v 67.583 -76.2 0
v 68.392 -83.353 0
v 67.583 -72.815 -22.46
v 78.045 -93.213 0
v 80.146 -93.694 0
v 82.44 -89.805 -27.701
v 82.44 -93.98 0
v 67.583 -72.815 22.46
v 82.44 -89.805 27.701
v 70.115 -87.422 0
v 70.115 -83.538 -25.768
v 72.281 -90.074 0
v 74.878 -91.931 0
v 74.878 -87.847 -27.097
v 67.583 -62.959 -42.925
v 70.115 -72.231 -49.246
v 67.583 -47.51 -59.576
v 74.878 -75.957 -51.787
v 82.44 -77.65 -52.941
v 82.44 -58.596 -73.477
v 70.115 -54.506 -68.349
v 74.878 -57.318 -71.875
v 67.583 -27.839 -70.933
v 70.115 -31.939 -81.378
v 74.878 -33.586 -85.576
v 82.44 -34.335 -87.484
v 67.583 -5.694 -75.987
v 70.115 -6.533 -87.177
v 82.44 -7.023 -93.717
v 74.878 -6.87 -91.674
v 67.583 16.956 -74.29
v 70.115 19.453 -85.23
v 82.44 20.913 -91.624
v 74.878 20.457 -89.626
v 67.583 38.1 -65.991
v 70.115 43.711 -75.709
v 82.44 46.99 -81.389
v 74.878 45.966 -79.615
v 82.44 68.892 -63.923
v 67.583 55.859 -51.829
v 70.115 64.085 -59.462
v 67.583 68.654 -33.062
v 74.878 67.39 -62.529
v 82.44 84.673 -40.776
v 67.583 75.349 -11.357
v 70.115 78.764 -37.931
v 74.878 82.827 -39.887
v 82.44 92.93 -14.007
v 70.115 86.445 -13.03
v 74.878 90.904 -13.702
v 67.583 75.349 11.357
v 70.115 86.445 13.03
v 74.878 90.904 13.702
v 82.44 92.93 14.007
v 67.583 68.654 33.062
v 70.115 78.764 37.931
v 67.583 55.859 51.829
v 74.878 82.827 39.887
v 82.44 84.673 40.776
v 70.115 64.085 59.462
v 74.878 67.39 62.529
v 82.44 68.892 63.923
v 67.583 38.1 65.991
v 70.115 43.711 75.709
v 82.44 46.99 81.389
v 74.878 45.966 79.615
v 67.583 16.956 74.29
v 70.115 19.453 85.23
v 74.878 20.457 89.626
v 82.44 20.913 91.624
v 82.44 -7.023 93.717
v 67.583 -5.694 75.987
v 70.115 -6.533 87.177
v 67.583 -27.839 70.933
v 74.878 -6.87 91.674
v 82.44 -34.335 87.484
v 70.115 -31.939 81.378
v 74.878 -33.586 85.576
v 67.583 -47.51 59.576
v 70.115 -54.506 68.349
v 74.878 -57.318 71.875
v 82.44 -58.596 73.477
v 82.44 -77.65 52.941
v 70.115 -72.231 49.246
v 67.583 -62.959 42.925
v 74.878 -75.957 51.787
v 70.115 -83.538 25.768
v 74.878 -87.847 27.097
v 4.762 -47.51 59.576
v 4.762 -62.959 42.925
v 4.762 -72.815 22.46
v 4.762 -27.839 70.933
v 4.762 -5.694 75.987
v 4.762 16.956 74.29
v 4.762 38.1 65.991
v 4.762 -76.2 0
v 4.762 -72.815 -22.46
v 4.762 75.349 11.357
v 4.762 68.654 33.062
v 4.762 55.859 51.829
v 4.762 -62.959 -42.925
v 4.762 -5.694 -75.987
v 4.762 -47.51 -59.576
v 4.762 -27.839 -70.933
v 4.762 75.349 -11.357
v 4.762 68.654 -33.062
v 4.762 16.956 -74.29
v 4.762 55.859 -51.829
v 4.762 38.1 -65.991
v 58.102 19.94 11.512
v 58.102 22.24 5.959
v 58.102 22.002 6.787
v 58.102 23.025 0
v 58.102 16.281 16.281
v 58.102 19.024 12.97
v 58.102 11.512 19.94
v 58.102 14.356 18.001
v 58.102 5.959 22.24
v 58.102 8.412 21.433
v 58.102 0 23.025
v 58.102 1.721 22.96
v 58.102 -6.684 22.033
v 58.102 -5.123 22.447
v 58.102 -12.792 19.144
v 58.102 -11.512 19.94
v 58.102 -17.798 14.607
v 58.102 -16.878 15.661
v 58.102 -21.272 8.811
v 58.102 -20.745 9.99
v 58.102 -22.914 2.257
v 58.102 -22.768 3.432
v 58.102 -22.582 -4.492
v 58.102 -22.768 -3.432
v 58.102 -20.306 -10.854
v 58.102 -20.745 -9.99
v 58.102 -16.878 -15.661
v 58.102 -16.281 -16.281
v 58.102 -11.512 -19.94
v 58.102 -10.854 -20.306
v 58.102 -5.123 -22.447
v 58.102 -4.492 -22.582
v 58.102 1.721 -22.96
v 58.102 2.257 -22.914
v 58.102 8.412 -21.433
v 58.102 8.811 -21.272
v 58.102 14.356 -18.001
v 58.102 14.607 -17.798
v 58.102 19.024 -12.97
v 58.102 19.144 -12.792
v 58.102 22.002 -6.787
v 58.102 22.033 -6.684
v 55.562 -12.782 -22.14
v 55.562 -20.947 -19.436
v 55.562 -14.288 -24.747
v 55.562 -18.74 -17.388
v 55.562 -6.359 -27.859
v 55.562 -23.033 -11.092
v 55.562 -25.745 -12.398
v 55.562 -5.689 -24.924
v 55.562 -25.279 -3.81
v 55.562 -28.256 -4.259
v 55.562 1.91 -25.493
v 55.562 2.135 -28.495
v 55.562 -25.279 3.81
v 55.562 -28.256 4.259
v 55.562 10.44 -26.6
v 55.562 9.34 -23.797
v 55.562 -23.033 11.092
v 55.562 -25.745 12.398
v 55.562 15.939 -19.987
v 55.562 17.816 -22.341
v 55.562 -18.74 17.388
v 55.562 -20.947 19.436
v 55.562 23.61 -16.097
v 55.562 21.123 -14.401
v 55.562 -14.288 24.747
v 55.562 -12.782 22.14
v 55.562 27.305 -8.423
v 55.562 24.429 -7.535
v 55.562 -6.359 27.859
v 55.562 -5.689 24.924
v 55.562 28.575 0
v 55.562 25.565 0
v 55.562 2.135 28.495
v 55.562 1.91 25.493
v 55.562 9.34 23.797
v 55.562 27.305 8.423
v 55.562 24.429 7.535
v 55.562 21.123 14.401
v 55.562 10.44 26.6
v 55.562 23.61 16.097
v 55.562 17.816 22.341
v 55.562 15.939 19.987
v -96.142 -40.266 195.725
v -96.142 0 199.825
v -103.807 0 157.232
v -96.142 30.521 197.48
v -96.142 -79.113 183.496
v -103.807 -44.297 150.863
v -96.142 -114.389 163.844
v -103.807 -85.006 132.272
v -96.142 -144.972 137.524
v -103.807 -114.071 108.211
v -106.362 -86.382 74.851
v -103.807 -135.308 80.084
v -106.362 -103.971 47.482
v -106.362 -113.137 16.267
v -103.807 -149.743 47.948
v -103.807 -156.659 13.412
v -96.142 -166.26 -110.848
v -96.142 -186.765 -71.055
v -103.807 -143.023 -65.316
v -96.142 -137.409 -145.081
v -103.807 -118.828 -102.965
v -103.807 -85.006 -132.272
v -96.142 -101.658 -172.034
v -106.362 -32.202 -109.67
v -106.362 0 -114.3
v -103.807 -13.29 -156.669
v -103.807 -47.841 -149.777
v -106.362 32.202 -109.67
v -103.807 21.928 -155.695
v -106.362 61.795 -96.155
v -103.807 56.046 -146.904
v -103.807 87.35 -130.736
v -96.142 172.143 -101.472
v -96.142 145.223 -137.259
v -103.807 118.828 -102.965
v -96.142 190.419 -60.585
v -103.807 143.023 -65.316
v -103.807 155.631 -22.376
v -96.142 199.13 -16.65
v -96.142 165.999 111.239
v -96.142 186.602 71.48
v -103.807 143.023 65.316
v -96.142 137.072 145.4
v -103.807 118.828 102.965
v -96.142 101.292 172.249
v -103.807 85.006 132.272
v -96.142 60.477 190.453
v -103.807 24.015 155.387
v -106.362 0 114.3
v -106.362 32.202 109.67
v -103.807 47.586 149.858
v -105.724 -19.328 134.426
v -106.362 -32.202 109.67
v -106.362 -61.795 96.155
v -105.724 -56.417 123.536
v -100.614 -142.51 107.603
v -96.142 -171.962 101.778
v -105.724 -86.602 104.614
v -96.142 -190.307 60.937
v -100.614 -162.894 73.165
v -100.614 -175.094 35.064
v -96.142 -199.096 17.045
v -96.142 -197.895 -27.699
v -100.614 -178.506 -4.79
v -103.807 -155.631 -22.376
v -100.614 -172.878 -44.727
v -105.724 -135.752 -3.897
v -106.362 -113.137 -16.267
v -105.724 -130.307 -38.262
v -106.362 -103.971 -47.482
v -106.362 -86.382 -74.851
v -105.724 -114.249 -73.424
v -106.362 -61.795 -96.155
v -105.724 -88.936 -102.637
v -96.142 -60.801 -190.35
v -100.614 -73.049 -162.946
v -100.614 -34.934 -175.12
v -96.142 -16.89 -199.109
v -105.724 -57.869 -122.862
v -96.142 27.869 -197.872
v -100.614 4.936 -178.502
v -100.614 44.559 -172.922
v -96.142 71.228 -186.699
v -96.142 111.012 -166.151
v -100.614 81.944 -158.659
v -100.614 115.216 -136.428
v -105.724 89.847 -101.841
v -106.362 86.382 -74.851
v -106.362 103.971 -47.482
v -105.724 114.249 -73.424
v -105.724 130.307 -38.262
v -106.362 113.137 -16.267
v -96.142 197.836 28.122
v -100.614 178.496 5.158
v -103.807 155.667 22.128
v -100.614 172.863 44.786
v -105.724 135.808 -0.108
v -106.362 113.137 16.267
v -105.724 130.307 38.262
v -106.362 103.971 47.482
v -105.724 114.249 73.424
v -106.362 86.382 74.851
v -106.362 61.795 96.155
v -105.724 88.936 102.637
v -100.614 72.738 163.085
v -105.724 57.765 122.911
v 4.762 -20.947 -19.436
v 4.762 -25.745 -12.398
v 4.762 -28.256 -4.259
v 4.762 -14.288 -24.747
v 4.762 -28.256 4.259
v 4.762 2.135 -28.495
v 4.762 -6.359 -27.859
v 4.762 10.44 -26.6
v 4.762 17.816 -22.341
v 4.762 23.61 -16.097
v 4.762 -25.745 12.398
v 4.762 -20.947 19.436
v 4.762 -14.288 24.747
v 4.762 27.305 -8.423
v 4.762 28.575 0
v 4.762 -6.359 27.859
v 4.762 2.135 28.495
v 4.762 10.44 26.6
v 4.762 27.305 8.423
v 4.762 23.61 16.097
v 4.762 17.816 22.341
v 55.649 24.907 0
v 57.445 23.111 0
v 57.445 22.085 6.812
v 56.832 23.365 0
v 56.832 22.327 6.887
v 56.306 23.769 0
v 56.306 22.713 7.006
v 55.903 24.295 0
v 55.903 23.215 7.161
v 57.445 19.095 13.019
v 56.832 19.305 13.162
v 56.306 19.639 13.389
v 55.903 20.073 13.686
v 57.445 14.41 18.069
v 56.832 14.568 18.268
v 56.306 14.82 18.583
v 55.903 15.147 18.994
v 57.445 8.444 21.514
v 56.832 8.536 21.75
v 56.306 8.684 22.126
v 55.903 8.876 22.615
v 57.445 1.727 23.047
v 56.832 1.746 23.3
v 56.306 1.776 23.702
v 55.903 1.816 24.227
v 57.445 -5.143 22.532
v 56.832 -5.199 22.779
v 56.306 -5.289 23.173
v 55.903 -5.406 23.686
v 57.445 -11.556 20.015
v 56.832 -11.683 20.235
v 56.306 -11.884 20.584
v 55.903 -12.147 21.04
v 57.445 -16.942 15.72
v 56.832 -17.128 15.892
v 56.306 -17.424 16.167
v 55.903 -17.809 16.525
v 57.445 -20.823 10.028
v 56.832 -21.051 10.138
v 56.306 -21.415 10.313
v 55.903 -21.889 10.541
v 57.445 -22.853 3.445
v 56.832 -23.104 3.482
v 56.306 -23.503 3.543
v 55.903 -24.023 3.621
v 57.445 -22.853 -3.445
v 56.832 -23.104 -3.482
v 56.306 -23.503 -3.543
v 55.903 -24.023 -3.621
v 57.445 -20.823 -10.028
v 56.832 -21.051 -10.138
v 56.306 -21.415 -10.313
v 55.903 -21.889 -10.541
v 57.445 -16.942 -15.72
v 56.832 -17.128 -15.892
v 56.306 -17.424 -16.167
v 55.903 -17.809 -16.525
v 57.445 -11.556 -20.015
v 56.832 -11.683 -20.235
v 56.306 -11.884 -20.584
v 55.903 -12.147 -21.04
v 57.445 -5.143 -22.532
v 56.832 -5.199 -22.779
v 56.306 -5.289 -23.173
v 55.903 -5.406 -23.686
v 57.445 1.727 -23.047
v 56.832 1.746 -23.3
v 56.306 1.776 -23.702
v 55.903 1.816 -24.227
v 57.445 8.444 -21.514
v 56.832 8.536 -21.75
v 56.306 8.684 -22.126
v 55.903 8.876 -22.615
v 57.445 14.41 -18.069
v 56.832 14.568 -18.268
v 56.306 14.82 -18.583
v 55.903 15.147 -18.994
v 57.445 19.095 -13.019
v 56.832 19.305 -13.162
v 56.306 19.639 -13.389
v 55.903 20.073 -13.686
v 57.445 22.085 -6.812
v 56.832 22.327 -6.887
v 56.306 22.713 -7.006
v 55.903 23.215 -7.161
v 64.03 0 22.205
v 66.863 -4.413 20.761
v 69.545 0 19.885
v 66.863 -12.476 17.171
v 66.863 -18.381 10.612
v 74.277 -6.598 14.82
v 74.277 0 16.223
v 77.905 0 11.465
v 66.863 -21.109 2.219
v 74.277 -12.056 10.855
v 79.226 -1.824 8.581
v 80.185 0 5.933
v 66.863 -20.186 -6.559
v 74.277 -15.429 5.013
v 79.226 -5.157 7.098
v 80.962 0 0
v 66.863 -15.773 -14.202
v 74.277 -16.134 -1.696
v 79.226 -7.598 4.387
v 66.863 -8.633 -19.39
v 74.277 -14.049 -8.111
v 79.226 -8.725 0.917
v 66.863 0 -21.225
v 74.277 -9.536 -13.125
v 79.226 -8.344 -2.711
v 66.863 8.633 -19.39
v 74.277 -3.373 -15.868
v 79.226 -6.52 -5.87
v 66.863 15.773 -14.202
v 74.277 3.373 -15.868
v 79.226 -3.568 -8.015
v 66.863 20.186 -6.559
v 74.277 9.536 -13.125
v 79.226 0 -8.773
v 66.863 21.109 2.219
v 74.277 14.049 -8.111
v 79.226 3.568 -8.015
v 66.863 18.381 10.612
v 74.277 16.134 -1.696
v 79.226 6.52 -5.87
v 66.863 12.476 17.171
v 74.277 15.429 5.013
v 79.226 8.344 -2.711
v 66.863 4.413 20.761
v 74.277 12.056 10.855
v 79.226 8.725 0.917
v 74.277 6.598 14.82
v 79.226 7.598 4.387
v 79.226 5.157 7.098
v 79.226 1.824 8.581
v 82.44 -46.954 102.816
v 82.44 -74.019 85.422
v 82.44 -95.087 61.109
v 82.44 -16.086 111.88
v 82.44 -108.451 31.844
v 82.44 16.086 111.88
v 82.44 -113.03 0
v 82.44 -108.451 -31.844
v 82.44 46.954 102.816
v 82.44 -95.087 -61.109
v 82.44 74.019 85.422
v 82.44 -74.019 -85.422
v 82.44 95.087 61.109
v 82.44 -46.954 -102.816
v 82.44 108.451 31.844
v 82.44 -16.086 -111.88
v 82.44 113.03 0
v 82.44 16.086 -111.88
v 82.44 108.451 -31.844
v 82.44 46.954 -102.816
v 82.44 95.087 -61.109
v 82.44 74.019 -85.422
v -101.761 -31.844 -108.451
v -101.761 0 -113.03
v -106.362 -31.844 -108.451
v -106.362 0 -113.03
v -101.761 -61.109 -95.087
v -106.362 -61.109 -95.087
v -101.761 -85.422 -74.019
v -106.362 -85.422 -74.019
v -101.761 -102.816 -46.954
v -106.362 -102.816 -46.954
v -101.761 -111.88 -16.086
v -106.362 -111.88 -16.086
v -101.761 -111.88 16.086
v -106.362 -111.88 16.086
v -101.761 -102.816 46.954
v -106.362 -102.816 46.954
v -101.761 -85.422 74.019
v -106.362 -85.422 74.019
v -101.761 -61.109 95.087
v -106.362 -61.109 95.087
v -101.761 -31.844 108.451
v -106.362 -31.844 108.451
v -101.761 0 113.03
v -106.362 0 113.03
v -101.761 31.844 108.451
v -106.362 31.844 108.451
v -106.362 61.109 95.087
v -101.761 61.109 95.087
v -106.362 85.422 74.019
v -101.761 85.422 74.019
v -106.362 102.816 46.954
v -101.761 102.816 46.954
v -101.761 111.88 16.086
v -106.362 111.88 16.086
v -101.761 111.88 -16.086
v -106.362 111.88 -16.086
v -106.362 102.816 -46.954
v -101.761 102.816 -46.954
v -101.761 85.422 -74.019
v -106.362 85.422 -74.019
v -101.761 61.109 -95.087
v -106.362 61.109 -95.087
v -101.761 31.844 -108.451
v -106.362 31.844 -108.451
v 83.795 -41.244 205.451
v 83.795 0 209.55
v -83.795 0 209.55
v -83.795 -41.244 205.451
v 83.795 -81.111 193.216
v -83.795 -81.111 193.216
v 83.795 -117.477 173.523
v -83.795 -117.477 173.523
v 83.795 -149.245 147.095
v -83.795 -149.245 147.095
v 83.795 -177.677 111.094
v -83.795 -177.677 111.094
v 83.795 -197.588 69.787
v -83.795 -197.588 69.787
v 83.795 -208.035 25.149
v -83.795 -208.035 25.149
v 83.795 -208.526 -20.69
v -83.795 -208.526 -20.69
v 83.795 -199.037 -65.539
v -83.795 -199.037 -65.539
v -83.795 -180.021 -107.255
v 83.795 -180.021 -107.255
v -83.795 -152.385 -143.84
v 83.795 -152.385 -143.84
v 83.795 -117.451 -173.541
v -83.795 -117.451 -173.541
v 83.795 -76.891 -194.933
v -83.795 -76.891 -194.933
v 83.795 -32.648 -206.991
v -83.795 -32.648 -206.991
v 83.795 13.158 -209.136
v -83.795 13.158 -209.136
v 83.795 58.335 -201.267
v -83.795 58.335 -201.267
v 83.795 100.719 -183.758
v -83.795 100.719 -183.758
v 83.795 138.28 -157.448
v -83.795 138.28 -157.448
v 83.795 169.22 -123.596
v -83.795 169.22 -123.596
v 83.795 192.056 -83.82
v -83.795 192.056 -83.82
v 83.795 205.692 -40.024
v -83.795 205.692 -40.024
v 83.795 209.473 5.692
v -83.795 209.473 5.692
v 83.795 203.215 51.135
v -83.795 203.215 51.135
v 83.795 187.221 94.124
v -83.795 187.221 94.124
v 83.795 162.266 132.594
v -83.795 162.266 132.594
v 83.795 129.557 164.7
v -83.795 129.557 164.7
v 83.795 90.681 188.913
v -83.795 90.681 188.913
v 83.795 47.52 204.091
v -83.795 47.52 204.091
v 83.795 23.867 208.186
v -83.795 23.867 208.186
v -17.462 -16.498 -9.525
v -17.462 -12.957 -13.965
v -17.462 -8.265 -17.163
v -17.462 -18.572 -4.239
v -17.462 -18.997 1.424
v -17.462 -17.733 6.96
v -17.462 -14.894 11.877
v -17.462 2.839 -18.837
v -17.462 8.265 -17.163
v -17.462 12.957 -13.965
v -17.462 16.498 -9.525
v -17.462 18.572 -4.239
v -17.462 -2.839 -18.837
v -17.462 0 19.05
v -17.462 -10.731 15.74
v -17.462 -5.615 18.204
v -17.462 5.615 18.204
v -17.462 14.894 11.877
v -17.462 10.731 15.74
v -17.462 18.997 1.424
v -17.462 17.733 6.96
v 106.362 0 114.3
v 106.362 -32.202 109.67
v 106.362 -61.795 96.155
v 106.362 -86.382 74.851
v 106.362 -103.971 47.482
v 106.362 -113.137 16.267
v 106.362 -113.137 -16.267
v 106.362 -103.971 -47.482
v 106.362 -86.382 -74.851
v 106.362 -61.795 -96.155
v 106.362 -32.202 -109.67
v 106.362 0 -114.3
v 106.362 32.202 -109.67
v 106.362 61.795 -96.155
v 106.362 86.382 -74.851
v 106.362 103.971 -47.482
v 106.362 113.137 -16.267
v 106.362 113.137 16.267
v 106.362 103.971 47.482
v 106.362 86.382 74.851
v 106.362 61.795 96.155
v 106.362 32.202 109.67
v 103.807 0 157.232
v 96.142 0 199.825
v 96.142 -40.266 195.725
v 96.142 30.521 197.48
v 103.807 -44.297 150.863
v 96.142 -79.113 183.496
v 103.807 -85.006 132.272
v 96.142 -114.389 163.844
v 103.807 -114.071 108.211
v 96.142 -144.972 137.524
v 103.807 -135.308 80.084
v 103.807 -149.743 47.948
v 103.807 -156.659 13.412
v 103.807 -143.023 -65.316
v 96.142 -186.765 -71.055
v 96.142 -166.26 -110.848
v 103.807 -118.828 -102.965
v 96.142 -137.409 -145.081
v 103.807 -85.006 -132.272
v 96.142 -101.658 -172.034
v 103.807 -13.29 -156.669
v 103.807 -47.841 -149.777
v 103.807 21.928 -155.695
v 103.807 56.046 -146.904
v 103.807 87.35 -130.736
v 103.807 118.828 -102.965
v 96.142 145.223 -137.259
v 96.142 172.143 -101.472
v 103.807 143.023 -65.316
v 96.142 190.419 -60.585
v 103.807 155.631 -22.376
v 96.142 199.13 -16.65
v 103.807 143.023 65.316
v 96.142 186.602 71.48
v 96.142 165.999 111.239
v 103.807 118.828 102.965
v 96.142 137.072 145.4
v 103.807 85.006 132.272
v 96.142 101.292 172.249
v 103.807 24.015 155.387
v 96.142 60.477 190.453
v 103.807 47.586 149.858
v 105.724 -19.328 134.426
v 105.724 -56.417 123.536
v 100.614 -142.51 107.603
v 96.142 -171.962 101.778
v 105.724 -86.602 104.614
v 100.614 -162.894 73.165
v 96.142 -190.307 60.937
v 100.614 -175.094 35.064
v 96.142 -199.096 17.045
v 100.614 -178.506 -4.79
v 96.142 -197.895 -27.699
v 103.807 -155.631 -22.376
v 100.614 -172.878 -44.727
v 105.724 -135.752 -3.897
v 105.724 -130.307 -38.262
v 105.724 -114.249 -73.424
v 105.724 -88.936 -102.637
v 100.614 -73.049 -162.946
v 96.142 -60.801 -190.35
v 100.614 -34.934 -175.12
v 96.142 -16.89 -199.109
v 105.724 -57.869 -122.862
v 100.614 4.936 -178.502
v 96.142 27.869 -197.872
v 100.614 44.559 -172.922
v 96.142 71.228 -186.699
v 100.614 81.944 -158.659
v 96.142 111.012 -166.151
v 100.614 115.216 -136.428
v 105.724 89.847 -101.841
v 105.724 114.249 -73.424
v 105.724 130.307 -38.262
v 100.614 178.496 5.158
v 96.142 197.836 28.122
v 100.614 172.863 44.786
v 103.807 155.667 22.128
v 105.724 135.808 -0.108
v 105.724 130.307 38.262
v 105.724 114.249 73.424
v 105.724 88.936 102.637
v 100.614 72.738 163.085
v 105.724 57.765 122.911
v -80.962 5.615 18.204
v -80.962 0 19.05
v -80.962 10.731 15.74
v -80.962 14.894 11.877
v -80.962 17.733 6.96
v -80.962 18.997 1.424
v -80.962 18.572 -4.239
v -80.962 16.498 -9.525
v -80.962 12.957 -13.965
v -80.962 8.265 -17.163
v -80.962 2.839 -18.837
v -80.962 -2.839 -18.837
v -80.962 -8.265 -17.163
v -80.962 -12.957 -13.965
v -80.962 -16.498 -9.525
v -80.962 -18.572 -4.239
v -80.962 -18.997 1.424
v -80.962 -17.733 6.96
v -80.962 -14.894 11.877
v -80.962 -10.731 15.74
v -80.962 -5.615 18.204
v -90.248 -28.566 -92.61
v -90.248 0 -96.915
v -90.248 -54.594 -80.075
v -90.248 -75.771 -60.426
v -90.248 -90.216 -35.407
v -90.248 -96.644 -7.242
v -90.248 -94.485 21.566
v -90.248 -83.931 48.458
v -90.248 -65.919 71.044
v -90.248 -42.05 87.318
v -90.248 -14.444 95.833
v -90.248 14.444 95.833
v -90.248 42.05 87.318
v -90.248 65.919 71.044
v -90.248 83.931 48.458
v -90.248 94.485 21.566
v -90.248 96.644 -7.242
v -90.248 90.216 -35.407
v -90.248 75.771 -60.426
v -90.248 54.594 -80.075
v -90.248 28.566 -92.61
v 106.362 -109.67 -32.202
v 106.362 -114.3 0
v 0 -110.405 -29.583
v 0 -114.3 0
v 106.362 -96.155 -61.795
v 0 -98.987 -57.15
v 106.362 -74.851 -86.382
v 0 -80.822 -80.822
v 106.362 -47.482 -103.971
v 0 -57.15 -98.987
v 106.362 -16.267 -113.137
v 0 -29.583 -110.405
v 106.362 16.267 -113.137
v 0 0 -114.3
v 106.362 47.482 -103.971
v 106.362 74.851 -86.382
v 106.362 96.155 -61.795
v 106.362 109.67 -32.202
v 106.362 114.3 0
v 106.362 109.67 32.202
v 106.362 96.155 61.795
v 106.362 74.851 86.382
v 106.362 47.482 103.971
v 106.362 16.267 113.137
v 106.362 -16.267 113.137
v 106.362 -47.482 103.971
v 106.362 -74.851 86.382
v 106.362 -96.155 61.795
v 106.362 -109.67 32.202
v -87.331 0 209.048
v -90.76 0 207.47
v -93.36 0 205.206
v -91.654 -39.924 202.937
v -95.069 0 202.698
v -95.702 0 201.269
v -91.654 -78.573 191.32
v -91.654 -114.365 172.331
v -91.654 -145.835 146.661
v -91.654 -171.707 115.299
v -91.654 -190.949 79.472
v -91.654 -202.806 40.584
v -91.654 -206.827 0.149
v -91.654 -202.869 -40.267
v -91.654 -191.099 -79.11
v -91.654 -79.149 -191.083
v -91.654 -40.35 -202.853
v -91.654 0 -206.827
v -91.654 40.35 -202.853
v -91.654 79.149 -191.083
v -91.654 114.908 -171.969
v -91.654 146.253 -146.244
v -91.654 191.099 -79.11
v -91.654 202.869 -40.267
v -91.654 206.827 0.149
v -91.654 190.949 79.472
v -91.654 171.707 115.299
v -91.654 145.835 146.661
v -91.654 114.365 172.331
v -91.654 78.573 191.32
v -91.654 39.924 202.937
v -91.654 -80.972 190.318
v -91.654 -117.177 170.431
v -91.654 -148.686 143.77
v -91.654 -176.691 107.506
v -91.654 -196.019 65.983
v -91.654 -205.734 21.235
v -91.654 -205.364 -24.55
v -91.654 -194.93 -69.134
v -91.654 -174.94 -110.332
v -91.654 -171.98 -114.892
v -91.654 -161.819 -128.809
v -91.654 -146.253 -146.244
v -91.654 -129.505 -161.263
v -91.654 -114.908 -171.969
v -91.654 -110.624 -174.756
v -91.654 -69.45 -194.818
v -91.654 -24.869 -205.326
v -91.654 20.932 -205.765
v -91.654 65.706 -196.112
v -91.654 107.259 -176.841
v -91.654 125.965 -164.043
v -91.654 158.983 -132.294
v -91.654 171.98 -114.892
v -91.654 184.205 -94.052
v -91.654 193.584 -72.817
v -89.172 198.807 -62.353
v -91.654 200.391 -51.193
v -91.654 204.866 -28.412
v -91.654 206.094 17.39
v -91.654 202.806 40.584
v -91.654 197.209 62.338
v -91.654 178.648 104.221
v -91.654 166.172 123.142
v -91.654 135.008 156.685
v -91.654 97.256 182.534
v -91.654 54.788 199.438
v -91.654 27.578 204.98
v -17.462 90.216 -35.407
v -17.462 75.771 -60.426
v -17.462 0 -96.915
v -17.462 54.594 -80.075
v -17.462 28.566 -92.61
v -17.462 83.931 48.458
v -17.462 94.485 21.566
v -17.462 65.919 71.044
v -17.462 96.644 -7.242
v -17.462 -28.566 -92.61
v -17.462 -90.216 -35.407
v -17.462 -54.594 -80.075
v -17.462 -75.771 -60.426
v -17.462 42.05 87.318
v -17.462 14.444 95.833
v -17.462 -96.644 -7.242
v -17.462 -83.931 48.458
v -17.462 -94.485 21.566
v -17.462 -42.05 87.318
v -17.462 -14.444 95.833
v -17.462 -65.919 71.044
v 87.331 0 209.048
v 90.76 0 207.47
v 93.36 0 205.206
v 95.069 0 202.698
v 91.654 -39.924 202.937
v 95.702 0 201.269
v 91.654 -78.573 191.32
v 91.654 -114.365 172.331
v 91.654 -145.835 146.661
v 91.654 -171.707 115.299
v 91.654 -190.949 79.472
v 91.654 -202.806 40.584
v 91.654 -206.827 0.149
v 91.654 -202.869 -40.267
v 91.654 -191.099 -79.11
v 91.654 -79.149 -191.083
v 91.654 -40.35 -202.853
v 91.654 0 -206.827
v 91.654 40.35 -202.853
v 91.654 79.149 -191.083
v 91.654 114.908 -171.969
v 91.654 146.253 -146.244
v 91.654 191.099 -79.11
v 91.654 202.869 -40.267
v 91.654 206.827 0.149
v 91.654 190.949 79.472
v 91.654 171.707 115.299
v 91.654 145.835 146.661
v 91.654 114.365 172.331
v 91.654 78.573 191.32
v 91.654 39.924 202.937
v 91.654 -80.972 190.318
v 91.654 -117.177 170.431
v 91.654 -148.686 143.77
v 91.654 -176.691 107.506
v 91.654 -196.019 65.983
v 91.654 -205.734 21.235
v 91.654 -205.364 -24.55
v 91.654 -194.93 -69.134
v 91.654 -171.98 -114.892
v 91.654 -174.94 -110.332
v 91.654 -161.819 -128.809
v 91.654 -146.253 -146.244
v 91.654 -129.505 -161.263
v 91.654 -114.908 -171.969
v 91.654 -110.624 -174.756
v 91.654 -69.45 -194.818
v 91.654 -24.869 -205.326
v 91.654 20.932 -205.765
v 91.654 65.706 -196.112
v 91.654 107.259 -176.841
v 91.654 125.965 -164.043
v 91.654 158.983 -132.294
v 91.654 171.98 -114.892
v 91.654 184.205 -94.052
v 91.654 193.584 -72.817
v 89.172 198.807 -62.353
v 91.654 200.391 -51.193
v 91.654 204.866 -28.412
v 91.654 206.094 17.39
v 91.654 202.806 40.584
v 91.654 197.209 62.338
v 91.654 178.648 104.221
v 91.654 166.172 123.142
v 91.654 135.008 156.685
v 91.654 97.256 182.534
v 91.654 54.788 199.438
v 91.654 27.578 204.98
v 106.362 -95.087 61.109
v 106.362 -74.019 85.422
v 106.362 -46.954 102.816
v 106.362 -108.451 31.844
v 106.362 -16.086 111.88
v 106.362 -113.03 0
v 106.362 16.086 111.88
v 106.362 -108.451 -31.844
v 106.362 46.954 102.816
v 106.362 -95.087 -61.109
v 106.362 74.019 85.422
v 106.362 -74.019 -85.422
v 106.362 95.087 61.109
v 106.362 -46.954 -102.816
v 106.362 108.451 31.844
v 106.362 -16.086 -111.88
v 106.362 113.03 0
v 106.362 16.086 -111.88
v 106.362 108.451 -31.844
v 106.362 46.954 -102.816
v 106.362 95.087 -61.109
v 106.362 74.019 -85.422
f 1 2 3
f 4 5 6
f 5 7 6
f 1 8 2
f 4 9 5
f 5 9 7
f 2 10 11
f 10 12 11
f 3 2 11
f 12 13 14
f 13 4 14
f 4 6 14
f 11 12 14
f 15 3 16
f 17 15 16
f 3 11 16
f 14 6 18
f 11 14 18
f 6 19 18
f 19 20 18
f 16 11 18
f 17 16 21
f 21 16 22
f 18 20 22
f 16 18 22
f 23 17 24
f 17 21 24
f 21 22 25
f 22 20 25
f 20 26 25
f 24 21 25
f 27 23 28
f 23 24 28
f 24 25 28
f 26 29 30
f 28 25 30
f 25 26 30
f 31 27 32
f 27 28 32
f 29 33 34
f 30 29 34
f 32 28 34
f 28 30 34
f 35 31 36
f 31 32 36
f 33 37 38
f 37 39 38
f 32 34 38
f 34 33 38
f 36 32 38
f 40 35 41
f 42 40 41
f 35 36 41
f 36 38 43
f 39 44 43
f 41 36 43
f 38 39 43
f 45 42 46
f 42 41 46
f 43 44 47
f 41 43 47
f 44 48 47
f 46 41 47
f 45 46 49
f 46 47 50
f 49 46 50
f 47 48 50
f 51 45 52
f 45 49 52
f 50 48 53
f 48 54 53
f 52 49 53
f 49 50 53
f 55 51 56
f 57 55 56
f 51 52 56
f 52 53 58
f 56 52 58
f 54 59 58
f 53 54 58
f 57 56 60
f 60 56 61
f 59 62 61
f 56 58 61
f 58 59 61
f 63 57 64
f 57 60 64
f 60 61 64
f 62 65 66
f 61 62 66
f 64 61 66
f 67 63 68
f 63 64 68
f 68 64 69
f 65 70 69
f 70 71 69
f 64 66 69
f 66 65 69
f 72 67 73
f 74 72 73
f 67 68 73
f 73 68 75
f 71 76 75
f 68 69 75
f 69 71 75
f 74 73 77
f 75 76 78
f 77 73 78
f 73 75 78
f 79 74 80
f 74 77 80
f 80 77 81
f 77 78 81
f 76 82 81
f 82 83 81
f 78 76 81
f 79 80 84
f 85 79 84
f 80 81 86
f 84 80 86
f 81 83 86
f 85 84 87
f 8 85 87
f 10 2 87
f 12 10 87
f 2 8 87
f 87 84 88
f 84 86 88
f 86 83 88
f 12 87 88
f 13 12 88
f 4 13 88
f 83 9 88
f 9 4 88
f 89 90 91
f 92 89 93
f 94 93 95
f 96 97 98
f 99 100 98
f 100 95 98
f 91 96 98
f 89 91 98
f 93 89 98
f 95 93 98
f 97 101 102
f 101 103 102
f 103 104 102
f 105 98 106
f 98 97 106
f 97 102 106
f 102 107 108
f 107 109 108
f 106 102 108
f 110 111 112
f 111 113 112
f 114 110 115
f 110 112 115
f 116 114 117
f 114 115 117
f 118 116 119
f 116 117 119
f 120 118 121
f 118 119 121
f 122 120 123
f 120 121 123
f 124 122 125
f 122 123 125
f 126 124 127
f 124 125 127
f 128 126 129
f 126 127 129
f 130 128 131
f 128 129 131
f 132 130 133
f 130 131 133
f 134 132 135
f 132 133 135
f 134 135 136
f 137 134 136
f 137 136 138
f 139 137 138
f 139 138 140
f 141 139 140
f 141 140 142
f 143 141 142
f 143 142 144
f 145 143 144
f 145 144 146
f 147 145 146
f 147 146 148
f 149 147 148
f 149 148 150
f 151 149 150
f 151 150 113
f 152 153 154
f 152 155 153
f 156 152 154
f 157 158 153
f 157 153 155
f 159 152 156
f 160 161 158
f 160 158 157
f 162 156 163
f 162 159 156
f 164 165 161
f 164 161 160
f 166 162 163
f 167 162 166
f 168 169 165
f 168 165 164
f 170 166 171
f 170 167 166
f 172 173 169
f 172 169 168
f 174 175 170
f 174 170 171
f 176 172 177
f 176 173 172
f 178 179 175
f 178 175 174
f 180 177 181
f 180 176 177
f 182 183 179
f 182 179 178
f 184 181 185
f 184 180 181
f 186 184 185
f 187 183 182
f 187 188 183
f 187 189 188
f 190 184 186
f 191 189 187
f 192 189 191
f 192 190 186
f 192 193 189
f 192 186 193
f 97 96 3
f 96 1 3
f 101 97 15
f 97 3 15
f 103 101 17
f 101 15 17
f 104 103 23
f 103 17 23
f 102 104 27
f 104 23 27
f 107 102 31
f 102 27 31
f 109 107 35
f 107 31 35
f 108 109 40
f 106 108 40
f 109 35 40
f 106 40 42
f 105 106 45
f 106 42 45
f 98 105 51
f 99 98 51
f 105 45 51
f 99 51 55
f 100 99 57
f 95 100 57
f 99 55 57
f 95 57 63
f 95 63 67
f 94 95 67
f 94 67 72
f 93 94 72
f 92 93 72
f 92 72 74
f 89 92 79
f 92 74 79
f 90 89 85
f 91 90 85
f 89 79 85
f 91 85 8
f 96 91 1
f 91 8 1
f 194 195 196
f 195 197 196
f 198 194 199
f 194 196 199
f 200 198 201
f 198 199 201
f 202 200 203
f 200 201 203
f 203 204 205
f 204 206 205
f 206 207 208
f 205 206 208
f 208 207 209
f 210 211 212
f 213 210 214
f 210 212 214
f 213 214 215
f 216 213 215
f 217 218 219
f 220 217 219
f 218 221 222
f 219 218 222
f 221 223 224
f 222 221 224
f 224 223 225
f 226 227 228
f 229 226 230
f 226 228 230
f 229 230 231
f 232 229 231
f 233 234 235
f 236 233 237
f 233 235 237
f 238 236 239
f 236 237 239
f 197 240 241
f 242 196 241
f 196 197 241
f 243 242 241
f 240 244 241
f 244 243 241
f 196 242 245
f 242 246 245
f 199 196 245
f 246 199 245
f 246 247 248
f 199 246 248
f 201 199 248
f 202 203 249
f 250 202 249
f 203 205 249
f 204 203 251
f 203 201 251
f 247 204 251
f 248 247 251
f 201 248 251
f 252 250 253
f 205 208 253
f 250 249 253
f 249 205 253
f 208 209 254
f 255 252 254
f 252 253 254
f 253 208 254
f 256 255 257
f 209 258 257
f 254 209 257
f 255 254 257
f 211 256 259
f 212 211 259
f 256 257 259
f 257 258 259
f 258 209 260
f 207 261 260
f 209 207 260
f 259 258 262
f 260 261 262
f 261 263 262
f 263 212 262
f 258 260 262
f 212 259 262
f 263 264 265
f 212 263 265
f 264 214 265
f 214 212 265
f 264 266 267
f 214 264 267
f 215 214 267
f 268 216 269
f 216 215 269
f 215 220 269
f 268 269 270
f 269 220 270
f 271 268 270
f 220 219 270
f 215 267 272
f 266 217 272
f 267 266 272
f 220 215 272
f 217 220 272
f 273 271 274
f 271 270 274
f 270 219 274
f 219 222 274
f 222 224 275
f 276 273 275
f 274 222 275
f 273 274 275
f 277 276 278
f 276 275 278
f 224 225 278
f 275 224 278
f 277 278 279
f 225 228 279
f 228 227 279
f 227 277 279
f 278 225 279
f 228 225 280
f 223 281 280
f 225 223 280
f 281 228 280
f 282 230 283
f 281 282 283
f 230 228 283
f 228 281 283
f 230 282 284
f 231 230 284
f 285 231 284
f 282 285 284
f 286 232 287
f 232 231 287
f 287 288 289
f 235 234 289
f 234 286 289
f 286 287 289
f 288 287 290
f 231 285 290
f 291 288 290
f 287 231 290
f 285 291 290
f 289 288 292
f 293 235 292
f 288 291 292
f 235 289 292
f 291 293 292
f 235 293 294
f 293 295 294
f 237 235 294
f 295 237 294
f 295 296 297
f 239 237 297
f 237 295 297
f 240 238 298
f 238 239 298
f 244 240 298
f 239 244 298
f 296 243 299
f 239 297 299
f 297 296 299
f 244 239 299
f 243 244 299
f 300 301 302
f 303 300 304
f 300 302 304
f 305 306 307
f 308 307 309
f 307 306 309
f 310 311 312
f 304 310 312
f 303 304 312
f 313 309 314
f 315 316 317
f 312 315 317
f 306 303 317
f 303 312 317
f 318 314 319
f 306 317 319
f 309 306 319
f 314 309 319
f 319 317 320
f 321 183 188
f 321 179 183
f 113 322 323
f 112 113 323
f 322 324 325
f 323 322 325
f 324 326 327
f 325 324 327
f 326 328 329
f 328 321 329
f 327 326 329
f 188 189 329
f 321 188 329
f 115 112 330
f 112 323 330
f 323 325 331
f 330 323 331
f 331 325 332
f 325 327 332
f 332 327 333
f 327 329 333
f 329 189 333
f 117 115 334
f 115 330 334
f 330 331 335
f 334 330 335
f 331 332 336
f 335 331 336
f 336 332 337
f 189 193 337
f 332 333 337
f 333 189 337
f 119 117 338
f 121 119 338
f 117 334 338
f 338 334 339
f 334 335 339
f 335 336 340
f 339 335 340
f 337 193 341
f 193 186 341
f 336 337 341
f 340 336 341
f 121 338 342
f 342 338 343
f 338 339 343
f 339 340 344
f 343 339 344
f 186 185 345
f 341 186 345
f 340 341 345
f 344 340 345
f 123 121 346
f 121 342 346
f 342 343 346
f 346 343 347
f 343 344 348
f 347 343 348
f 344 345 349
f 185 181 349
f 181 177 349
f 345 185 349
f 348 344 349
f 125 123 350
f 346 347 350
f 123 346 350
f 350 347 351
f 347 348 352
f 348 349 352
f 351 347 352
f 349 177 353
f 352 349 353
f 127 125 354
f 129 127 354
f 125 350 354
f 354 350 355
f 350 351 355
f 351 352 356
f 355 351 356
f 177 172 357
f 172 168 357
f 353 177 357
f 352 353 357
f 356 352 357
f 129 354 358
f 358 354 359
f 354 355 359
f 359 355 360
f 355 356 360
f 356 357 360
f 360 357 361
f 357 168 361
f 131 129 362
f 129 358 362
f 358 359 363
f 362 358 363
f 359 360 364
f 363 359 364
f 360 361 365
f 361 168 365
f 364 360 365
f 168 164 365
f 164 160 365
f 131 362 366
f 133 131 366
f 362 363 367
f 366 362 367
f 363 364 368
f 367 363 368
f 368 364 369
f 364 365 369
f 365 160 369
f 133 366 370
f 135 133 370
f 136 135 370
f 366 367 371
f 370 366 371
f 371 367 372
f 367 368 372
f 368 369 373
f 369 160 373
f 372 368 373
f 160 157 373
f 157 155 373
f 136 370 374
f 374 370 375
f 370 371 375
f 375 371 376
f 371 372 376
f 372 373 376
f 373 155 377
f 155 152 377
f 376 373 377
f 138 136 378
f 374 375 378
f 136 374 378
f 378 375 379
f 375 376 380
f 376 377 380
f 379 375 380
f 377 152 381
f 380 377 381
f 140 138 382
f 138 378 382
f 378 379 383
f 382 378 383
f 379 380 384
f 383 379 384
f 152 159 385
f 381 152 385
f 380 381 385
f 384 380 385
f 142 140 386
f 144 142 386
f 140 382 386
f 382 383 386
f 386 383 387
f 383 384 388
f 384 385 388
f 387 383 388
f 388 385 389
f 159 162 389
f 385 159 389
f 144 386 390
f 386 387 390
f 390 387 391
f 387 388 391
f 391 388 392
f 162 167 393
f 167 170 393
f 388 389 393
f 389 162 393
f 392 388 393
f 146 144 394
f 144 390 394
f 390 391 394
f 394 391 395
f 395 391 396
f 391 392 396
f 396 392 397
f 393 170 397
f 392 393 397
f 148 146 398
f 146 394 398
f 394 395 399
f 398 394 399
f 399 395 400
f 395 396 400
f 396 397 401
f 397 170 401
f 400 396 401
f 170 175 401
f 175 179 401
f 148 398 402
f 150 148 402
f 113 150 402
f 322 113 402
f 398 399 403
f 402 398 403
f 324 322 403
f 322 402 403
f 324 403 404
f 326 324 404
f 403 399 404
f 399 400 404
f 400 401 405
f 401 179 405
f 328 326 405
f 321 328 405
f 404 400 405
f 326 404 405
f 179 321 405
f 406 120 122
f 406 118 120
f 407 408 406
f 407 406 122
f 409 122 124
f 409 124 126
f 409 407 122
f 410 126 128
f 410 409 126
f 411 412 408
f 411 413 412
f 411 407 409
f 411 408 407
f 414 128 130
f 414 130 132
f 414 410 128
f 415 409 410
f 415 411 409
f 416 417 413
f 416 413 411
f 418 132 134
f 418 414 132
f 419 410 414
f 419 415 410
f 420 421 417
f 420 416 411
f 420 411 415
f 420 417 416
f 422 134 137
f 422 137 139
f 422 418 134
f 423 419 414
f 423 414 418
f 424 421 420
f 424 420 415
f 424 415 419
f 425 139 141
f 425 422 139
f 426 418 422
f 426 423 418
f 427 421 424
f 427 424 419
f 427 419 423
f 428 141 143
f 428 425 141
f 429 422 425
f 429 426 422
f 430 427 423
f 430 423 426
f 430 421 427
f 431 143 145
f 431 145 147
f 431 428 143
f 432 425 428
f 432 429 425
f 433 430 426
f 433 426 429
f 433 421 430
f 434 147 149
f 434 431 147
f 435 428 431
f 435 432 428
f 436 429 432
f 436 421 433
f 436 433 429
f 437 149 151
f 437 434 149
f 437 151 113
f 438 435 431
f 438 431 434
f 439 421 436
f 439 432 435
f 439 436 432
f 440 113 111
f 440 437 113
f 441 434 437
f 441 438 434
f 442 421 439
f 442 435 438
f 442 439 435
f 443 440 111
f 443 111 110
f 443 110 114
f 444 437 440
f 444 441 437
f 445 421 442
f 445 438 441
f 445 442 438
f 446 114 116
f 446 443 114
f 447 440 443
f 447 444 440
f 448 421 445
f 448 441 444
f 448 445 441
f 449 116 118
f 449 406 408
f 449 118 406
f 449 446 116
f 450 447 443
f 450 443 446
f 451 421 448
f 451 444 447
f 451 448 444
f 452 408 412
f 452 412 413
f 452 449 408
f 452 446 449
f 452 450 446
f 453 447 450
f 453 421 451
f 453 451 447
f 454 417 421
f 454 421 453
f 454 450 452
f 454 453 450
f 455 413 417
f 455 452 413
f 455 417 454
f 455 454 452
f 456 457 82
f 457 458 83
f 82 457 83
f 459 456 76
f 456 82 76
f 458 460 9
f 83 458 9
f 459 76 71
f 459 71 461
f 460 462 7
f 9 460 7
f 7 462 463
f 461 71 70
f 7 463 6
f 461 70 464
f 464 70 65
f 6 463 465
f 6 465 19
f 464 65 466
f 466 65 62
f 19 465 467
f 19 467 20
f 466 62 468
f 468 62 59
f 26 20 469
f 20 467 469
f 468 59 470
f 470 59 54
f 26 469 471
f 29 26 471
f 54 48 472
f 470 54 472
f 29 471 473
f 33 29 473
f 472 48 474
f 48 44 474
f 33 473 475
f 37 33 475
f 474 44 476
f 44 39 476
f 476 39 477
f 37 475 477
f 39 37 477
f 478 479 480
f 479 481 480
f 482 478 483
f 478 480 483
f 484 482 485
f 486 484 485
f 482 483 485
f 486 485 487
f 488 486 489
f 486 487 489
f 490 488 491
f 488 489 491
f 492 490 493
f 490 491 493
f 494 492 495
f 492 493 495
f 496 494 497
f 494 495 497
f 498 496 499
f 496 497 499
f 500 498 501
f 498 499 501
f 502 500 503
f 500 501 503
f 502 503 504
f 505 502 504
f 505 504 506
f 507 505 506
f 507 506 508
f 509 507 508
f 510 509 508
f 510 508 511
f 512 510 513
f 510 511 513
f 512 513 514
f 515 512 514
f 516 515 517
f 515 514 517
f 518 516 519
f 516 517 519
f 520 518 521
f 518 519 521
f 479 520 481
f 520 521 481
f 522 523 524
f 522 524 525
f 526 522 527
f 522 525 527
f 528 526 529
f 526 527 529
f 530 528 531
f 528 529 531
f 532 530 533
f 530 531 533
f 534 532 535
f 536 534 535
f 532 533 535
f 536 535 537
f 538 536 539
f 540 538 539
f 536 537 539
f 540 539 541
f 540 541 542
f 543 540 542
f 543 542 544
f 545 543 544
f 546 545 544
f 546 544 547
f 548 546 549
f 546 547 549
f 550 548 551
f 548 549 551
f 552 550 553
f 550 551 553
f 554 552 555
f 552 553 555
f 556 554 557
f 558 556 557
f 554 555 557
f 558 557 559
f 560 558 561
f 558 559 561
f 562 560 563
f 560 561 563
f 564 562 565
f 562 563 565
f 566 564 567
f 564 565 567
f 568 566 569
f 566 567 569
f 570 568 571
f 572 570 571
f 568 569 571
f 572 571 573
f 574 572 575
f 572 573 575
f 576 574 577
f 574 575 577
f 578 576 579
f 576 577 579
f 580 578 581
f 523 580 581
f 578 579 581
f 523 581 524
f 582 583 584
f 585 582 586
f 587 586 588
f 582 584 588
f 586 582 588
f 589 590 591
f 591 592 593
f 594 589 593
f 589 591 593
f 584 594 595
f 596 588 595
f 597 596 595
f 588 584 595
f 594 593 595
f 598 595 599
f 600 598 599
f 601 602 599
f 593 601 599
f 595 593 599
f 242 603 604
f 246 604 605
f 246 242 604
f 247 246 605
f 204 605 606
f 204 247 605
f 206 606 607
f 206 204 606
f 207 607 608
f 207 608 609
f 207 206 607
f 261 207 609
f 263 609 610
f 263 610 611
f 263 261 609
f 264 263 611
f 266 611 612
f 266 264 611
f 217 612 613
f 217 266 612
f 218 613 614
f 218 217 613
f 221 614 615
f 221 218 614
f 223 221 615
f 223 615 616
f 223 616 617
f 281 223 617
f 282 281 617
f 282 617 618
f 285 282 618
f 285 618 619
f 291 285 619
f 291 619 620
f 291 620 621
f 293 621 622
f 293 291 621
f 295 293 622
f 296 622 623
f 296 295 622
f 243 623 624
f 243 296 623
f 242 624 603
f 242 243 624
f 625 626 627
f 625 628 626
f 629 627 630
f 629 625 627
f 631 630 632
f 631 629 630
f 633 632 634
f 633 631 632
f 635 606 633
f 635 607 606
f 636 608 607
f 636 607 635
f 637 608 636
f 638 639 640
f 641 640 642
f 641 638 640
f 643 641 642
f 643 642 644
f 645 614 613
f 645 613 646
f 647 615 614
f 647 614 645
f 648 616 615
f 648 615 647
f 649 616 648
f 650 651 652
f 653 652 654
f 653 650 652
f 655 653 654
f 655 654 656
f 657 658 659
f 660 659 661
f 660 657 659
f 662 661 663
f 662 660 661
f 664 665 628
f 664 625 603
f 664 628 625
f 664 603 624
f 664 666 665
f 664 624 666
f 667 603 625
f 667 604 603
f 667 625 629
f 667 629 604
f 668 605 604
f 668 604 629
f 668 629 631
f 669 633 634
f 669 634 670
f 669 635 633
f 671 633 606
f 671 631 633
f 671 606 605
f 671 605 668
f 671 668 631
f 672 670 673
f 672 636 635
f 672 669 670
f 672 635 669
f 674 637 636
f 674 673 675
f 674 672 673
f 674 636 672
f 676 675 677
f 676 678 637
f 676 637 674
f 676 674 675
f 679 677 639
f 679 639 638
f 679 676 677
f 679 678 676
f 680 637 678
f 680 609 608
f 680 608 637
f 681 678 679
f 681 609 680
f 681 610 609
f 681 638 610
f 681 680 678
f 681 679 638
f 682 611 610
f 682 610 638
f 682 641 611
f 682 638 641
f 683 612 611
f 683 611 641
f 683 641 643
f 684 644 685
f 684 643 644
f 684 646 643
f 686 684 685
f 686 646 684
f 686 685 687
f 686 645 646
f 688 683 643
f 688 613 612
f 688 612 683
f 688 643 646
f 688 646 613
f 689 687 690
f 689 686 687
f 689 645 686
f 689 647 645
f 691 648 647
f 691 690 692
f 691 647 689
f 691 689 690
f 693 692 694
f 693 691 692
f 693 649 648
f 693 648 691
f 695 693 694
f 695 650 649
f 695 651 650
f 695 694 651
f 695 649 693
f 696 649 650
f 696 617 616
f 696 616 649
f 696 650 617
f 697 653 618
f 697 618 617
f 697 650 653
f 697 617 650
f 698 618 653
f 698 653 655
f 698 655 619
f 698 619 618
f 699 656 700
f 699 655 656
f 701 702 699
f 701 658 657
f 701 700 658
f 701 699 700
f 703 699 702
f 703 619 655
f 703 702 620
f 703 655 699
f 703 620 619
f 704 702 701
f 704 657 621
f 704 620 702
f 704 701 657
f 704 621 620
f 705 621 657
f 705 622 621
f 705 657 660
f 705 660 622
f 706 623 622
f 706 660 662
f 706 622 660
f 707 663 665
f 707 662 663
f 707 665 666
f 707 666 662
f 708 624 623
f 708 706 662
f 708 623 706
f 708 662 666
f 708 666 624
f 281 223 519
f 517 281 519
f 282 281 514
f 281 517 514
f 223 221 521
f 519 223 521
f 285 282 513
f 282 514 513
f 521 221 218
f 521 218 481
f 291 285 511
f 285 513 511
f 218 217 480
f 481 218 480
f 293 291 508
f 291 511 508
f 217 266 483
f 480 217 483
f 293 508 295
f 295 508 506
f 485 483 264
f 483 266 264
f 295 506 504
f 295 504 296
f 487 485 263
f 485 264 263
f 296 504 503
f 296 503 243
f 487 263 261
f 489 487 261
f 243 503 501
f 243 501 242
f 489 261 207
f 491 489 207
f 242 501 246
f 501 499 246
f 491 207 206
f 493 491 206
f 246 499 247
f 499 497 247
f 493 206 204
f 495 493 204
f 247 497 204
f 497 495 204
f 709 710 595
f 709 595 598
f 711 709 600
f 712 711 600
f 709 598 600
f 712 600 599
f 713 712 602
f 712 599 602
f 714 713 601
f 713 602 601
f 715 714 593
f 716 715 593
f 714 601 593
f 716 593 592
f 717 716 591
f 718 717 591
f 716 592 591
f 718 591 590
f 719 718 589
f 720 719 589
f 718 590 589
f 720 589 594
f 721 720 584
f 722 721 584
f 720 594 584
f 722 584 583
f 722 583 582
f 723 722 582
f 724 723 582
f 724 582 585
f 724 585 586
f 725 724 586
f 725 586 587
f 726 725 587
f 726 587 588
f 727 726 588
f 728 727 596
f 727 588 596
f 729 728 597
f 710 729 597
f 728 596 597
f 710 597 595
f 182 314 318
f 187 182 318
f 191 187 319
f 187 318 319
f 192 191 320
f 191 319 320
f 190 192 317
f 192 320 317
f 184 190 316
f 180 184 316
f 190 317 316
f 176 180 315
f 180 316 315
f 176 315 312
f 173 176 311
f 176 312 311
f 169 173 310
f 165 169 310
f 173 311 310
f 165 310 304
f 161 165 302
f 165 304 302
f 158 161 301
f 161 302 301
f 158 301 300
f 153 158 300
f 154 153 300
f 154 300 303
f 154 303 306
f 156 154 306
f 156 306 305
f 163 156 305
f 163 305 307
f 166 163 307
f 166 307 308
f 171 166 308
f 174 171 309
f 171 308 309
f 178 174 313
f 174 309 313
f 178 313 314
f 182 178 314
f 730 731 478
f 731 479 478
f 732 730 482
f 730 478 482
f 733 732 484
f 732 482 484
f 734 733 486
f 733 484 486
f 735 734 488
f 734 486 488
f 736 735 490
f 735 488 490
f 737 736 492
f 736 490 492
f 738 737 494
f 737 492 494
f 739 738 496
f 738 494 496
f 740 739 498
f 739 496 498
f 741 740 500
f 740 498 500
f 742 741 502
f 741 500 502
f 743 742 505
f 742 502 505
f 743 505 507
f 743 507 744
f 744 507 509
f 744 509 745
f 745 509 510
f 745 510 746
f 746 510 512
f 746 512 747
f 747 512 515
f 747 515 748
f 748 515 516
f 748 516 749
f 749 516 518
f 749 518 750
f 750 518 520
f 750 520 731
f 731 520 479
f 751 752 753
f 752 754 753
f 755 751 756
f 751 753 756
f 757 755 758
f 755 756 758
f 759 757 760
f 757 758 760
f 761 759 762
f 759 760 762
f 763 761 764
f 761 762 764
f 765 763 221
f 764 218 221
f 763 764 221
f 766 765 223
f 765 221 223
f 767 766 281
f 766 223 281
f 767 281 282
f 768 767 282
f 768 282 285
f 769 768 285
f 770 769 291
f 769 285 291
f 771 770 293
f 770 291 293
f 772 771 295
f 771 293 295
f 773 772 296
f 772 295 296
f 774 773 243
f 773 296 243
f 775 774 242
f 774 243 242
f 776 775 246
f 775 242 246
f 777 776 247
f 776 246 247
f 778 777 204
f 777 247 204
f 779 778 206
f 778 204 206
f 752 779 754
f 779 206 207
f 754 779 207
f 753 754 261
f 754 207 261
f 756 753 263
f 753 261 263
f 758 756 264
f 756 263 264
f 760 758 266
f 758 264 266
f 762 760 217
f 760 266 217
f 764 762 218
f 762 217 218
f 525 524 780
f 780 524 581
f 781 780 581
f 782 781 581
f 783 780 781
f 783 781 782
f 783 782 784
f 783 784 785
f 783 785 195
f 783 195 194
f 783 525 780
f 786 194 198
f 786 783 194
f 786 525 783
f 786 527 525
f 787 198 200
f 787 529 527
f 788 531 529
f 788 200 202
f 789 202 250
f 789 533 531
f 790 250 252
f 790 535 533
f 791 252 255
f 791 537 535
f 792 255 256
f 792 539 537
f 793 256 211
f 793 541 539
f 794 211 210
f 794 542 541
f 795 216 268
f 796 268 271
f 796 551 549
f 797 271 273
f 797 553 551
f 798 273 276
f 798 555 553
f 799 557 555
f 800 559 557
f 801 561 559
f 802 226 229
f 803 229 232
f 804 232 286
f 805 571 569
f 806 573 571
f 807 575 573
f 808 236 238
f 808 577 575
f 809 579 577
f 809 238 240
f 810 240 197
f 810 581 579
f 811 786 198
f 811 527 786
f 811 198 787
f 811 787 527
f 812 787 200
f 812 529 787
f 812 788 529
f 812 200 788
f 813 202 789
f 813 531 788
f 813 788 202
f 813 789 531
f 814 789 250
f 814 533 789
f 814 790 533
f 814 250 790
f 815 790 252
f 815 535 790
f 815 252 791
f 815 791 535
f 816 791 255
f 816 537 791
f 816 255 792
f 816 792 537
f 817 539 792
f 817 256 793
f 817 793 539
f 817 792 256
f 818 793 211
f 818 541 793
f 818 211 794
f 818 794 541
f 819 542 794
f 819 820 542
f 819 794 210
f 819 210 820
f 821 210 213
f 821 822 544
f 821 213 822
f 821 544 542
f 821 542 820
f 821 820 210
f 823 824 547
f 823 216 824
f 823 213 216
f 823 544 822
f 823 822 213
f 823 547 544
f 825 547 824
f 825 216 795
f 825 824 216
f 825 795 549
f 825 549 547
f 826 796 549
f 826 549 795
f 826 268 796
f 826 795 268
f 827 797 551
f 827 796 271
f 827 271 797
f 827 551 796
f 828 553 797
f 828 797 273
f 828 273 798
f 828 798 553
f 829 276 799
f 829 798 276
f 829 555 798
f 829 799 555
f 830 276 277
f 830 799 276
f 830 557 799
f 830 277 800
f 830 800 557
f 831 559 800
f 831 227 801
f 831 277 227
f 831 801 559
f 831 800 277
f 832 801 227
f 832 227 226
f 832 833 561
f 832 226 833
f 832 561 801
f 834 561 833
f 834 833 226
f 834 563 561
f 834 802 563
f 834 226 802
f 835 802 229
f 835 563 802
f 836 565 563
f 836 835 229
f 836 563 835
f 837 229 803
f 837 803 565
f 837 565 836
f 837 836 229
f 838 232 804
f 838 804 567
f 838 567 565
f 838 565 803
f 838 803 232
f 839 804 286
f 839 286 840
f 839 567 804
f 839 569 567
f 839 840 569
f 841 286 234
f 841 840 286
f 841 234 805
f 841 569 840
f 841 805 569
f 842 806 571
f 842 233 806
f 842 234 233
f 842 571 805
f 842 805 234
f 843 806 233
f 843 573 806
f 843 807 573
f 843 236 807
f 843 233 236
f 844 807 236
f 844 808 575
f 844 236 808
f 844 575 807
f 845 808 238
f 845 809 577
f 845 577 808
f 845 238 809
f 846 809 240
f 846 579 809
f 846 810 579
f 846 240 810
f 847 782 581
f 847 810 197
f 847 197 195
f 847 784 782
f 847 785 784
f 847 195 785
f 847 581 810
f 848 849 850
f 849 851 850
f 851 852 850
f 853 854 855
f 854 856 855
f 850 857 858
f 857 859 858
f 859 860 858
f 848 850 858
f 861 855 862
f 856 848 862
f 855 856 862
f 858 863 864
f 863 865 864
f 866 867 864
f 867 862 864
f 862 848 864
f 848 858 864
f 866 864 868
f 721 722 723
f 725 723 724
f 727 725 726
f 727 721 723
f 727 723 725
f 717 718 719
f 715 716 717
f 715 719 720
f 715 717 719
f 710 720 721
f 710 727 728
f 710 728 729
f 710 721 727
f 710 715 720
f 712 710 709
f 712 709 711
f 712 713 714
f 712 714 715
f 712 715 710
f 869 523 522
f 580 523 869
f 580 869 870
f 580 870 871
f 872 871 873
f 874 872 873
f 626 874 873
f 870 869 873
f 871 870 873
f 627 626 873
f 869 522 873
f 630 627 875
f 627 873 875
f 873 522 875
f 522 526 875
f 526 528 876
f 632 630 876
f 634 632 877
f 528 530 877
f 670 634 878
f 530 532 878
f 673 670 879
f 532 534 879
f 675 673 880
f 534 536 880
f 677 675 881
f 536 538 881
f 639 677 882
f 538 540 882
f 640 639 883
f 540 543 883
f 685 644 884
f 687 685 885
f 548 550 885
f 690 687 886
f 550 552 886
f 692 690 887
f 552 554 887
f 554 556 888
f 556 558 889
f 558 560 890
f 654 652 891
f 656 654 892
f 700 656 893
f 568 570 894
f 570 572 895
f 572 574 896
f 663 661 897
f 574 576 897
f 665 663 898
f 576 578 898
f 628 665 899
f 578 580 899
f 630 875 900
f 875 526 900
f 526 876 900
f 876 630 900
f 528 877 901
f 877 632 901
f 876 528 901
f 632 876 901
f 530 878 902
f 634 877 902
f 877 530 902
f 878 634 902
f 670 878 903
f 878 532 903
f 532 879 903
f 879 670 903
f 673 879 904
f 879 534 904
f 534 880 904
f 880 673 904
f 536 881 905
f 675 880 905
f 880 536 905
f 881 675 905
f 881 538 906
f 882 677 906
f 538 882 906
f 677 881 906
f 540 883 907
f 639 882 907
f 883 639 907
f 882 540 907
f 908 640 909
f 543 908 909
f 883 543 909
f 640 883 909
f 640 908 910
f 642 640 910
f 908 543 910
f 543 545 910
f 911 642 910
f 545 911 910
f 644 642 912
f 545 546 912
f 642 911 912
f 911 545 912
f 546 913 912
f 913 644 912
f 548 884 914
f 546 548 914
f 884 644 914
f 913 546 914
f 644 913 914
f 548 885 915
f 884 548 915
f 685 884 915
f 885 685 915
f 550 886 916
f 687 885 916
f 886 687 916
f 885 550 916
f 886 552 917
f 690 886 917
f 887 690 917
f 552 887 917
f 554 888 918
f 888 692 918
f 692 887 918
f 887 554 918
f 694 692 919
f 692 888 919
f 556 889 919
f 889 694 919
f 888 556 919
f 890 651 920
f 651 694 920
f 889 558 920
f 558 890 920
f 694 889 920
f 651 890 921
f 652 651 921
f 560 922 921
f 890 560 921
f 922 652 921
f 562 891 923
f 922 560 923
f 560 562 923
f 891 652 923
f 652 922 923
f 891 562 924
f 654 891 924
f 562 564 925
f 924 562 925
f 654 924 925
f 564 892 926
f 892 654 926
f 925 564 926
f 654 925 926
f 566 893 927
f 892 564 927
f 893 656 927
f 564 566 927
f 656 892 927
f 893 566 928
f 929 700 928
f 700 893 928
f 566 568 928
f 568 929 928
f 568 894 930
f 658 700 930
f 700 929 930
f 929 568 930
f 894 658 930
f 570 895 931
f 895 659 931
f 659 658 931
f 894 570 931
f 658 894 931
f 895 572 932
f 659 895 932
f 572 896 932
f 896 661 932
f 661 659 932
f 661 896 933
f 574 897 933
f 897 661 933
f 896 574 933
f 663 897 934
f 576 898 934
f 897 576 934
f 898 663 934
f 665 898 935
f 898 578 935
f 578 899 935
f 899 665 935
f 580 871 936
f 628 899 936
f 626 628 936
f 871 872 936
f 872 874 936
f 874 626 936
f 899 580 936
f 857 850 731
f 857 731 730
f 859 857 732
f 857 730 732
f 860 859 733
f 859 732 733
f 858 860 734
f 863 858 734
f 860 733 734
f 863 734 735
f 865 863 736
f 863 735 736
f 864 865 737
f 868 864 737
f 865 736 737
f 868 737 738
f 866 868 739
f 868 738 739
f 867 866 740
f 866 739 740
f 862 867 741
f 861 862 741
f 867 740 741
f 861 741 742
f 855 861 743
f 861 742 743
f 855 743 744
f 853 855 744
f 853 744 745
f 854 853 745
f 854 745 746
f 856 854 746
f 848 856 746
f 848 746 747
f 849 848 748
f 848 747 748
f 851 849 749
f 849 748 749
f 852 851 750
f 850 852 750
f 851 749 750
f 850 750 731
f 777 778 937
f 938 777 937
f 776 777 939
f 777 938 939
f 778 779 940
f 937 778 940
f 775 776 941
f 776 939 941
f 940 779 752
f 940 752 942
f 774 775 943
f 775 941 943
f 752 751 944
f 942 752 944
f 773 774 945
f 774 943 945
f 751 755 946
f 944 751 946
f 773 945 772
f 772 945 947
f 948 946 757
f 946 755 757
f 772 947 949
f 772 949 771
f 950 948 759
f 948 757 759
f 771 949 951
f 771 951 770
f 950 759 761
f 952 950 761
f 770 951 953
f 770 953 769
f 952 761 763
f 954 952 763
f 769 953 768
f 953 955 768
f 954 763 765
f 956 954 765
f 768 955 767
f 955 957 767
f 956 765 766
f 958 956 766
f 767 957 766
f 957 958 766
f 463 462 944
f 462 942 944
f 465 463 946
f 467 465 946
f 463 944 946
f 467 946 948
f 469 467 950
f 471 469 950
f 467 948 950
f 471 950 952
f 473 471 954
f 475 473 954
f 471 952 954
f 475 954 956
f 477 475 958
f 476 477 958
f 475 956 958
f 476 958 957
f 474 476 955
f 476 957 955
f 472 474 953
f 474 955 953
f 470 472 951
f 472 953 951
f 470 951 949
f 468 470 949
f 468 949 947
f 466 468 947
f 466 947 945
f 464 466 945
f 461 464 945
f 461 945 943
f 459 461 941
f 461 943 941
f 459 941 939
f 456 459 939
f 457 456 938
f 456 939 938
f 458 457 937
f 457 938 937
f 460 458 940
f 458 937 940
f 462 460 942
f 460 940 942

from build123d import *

# Parameters (mm, degrees)
SKETCH4_R           = 28.575
BOSS_EXTRUDE2_DEPTH = 50.8
SKETCH6_R           = 23.024747335
BOSS_EXTRUDE5_DEPTH = 2.54
DOME1_FACE_RADIUS   = 23.024747335
DOME1_HEIGHT        = 22.86
FILLET1_R           = 2.54
SKETCH5_R           = 19.05
BOSS_EXTRUDE3_DEPTH = 63.5
FILLET2_R           = 12.7


with BuildPart() as part:
    # Sketch1 → Revolve1 (revolve)
    with BuildSketch(Plane.XY, mode=Mode.PRIVATE) as revolve1_sk:
        with BuildLine():
            Line((0, 209.55), (93.6625, 209.55))
            add(Edge.make_bspline(
                [(93.6625, 209.55), (106.3625, 162.346468393), (106.3625, 114.3)],
                knots=[0, 0, 0, 1, 1, 1], degree=2))
            Line((106.3625, 114.3), (0, 114.3))
            Line((0, 114.3), (0, 209.55))
        make_face()
    revolve1 = revolve(revolve1_sk.sketch.rotate(Axis((0, 0, 0), (1, 0, 0)), 90), axis=Axis((0, 0, 0), (1, 0, 0)))

    # Mirror1: Revolve1 across Right Plane
    add(revolve1.mirror(Plane(origin=(0, 0, 0), x_dir=(0, 0, -1), z_dir=(1, 0, 0))))

    # Fillet2
    fillet2_edges = [part.edges().sort_by_distance(p)[0] for p in [
        (-93.6625, 0, -209.55),
        (93.6625, 0, -209.55),
    ]]
    fillet(fillet2_edges, radius=FILLET2_R)


with BuildPart() as body_2:
    # Sketch2 → Revolve2 (revolve)
    with BuildSketch(Plane.XY, mode=Mode.PRIVATE) as revolve2_sk:
        Polygon((-17.4625, 0), (-17.4625, 96.915183097), (-90.247683097, 96.915183097), (-101.760694514, 113.03), (-106.3625, 113.03), (-106.3625, 114.3), (0, 114.3), (0, 0), align=None)
    revolve(revolve2_sk.sketch.rotate(Axis((0, 0, 0), (-1, 0, 0)), 90), axis=Axis((0, 0, 0), (-1, 0, 0)))

    # Sketch3 → Revolve3 (revolve)
    with BuildSketch(Plane.XY, mode=Mode.PRIVATE) as revolve3_sk:
        with BuildLine():
            Line((106.3625, 114.3), (0, 114.3))
            Line((0, 114.3), (0, 0))
            Line((0, 0), (4.7625, 0))
            Line((4.7625, 0), (4.7625, 76.2))
            Line((4.7625, 76.2), (67.583190848, 76.2))
            add(Edge.make_bspline(
                [(67.583190848, 76.2), (67.397414566, 92.789135053), (82.439526037, 93.98)],
                knots=[0, 0, 0, 1, 1, 1], degree=2))
            Line((82.439526037, 93.98), (82.439526037, 113.03))
            Line((82.439526037, 113.03), (106.3625, 113.03))
            Line((106.3625, 113.03), (106.3625, 114.3))
        make_face()
    revolve(revolve3_sk.sketch.rotate(Axis((4.7625, 0, 0), (1, 0, 0)), 180), axis=Axis((4.7625, 0, 0), (1, 0, 0)))


with BuildPart() as body_3:
    # Sketch4 → Boss-Extrude2 (new body)
    with BuildSketch(Plane(origin=(4.7625, 0, 0), x_dir=(0, 0, -1), z_dir=(1, 0, 0))):
        with Locations(Location((0, 0, 0), (0, 0, 90))):
            Circle(SKETCH4_R)
    extrude(amount=BOSS_EXTRUDE2_DEPTH)

    # Sketch6 → Boss-Extrude5 (add)
    with BuildSketch(Plane(origin=(55.5625, 0, 0), x_dir=(0, 0, -1), z_dir=(1, 0, 0))):
        with Locations(Location((0, 0, 0), (0, 0, 90))):
            Circle(SKETCH6_R)
    extrude(amount=BOSS_EXTRUDE5_DEPTH)

    # Dome1: a dome of height H over a round flat face of radius A is a cap of a sphere of radius (A * A + H * H) / (2 * H)
    dome1_r = (DOME1_FACE_RADIUS * DOME1_FACE_RADIUS + DOME1_HEIGHT * DOME1_HEIGHT) / (2 * DOME1_HEIGHT)
    dome1_base = Plane((58.1025, 0, 0), z_dir=(1, 0, 0))
    with Locations(dome1_base.offset(DOME1_HEIGHT - dome1_r)):
        dome1_ball = Sphere(dome1_r, mode=Mode.PRIVATE)
    add(split(dome1_ball, bisect_by=dome1_base, keep=Keep.TOP, mode=Mode.PRIVATE))

    # Fillet1
    fillet1_edges = [body_3.edges().sort_by_distance(p)[0] for p in [
        (55.5625, -23.024747335, 0),
    ]]
    fillet(fillet1_edges, radius=FILLET1_R - 0.0001)  # a hair under: the kernel refuses the full size


with BuildPart() as body_4:
    # Sketch5 → Boss-Extrude3 (new body)
    with BuildSketch(Plane.ZY.offset(17.4625)):
        Circle(SKETCH5_R)
    extrude(amount=BOSS_EXTRUDE3_DEPTH)


solid = Compound([part.part, body_2.part, body_3.part, body_4.part])
